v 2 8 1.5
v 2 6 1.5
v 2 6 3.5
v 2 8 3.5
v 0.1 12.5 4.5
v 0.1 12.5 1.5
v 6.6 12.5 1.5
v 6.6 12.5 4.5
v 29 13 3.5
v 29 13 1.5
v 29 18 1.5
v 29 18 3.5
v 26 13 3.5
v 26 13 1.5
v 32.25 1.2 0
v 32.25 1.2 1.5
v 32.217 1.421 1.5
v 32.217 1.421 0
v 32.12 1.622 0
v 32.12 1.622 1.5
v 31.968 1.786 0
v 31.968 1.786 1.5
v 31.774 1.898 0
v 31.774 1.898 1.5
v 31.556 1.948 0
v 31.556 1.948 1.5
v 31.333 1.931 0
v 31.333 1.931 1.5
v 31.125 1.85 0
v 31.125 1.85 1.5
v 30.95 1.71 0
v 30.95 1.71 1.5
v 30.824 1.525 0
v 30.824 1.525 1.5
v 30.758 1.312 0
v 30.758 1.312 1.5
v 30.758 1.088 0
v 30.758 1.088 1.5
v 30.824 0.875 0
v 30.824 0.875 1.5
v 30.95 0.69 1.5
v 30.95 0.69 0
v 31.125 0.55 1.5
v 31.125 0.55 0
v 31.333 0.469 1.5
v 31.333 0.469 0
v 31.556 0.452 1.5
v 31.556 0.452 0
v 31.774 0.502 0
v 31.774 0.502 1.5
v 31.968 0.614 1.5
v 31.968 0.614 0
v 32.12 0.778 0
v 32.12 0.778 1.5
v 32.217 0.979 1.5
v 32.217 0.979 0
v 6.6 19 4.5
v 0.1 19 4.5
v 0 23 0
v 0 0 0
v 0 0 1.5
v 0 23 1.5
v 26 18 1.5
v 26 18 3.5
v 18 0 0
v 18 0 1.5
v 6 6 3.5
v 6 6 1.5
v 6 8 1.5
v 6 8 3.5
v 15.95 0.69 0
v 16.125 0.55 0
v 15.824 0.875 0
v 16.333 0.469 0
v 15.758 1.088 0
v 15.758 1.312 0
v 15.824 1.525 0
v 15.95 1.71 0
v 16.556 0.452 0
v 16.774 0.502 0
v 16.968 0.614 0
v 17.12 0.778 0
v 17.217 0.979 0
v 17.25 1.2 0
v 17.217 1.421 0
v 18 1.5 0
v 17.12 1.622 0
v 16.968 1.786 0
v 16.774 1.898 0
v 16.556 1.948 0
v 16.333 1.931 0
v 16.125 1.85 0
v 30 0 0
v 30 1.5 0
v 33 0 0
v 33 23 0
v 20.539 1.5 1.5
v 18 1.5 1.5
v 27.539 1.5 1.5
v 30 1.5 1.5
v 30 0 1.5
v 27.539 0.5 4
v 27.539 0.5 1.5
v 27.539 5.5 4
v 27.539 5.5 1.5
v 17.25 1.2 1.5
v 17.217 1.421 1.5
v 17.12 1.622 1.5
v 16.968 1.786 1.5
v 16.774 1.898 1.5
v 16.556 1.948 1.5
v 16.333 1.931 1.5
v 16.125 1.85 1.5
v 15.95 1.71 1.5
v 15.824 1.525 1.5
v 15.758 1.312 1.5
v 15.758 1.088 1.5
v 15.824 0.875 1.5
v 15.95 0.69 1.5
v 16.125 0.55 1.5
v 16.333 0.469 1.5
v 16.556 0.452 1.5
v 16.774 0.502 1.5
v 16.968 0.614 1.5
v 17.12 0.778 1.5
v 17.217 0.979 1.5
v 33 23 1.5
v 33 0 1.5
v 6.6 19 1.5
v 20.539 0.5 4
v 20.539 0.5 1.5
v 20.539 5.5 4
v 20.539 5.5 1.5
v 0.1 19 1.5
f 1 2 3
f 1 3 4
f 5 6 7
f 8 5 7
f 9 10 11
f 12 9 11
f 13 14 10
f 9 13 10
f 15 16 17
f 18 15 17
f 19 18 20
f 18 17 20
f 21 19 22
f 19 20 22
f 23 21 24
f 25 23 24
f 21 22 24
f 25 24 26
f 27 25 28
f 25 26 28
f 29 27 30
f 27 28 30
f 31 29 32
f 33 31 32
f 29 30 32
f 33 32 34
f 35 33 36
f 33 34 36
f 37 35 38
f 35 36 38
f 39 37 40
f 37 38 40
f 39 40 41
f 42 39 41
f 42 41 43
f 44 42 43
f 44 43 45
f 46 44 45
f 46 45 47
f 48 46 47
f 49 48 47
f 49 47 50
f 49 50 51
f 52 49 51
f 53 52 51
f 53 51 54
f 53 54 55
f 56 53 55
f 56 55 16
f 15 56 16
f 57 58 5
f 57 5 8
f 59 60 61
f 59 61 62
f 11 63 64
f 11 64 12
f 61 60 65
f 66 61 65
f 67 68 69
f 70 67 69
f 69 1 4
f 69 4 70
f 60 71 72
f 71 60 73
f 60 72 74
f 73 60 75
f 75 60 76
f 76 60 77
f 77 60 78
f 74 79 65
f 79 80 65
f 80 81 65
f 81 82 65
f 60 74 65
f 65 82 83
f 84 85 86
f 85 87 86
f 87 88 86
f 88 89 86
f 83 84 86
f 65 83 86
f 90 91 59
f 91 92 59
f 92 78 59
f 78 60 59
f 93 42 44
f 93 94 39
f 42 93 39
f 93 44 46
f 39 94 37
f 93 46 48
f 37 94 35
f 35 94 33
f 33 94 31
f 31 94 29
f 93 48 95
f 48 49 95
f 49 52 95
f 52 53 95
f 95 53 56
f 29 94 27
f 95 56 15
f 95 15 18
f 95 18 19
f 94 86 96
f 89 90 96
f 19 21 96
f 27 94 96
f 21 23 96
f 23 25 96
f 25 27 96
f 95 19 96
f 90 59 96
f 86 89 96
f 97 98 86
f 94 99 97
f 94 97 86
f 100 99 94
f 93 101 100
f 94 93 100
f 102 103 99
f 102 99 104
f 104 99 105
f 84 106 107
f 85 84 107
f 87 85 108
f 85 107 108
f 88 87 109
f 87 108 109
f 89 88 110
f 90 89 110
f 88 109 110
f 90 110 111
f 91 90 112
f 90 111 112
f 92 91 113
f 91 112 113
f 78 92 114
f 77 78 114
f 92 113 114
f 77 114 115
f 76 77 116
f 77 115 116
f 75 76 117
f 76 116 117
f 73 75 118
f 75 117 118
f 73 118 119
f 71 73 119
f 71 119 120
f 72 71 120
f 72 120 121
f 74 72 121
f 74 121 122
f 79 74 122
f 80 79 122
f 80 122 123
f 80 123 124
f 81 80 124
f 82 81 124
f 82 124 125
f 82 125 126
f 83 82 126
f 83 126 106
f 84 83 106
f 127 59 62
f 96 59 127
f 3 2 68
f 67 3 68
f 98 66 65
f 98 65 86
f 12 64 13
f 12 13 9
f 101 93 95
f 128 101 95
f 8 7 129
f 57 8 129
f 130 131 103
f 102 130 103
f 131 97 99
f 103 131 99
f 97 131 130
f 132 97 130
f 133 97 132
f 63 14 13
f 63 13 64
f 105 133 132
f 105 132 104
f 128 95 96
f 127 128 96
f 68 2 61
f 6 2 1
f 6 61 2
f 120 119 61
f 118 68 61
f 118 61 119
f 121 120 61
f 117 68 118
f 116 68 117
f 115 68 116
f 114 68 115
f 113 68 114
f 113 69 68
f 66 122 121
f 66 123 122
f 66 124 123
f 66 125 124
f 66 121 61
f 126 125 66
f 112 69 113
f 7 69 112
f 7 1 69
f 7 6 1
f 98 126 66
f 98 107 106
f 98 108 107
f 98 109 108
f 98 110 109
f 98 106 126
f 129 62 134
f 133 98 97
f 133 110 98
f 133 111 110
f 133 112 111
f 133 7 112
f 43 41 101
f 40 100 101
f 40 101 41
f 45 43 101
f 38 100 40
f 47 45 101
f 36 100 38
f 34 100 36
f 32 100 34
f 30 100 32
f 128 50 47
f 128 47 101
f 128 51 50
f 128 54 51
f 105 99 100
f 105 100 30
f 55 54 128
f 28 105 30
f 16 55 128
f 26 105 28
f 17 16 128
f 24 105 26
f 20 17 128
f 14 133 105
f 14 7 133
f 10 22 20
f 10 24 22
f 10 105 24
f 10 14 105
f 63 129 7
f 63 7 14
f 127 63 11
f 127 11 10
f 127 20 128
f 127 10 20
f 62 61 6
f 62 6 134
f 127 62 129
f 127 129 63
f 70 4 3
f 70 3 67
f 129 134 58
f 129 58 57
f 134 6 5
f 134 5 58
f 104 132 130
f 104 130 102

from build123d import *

# Parameters (mm, degrees)
SKETCH_1_W          = 33
SKETCH_1_H          = 23
EXTRUDE_1_DEPTH     = 1.5
SKETCH_2_W          = 12
SKETCH_2_H          = 1.5
CUT_EXTRUDE_1_DEPTH = 41.252329125
SKETCH_3_R          = 0.75
CUT_EXTRUDE_2_DEPTH = 41.252329125
SKETCH_4_W          = 4
SKETCH_4_H          = 2
EXTRUDE_2_DEPTH     = 2
SKETCH_5_W          = 3
SKETCH_5_H          = 5
EXTRUDE_3_DEPTH     = 2
SKETCH_6_W          = 6.5
SKETCH_6_H          = 6.5
EXTRUDE_4_DEPTH     = 3
SKETCH_7_W          = 7
SKETCH_7_H          = 5
EXTRUDE_5_DEPTH     = 2.5


with BuildPart() as part:
    # 草图1 → 凸台-拉伸1 (new body)
    with BuildSketch(Plane.XY):
        with Locations((16.5, 11.5)):
            Rectangle(SKETCH_1_W, SKETCH_1_H)
    extrude(amount=EXTRUDE_1_DEPTH)

    # 草图2 → 切除-拉伸1 (cut, through all)
    with BuildSketch(Plane.XY.offset(1.5)):
        with Locations((24, 0.75)):
            Rectangle(SKETCH_2_W, SKETCH_2_H)
    extrude(amount=-CUT_EXTRUDE_1_DEPTH, mode=Mode.SUBTRACT)

    # 草图3 → 切除-拉伸2 (cut, through all)
    with BuildSketch(Plane.XY.offset(1.5)):
        with Locations((31.5, 1.2)):
            Circle(SKETCH_3_R)
        with Locations((16.5, 1.2)):
            Circle(SKETCH_3_R)
    extrude(amount=-CUT_EXTRUDE_2_DEPTH, mode=Mode.SUBTRACT)

    # 草图4 → 凸台-拉伸2 (add)
    with BuildSketch(Plane.XY.offset(1.5)):
        with Locations((4, 7)):
            Rectangle(SKETCH_4_W, SKETCH_4_H)
    extrude(amount=EXTRUDE_2_DEPTH)

    # 草图5 → 凸台-拉伸3 (add)
    with BuildSketch(Plane.XY.offset(1.5)):
        with Locations((27.5, 15.5)):
            Rectangle(SKETCH_5_W, SKETCH_5_H)
    extrude(amount=EXTRUDE_3_DEPTH)

    # 草图6 → 凸台-拉伸4 (add)
    with BuildSketch(Plane.XY.offset(1.5)):
        with Locations((3.35, 15.75)):
            Rectangle(SKETCH_6_W, SKETCH_6_H)
    extrude(amount=EXTRUDE_4_DEPTH)

    # 草图7 → 凸台-拉伸5 (add)
    with BuildSketch(Plane.XY.offset(1.5)):
        with Locations((24.039083368, 3)):
            Rectangle(SKETCH_7_W, SKETCH_7_H)
    extrude(amount=EXTRUDE_5_DEPTH)


solid = part.part
